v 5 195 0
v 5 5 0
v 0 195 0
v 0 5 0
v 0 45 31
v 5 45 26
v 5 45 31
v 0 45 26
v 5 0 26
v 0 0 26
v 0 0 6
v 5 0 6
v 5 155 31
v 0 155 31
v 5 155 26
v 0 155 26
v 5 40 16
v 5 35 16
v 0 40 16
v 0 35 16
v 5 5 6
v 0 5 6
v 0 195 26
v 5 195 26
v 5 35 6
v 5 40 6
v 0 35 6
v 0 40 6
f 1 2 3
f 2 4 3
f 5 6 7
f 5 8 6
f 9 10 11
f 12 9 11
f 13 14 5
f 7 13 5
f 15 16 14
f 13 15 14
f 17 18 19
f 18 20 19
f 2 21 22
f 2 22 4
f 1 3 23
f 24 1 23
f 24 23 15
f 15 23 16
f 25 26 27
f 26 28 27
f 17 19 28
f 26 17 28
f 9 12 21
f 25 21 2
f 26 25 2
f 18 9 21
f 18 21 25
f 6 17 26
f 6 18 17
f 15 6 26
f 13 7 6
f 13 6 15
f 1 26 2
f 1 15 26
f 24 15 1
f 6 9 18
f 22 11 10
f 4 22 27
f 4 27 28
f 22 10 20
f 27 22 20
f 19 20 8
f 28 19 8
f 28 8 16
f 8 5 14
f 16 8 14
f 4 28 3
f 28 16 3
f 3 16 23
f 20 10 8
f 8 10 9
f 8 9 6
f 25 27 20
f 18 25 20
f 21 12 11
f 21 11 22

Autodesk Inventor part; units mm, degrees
ref_plane "YZ Plane" through (0, 0, 0) normal (1, 0, 0) x (0, 1, 0)
ref_plane "XZ Plane" through (0, 0, 0) normal (0, 1, 0) x (-1, 0, 0)
ref_plane "XY Plane" through (0, 0, 0) normal (0, 0, 1) x (1, 0, 0)
sketch "Sketch1" plane through (0, 0, 0) normal (1, 0, 0) x (0, 1, 0)
  line L0 (0, 0) -> (200, 0)
  line L1 (200, 0) -> (200, 31)
  line L2 (200, 31) -> (0, 31)
  line L3 (0, 31) -> (0, 0)
  dimension "d0" = 31
  dimension "d1" = 200
extrude "Extrusion1" add sketch "Sketch1" along normal blind 5
sketch "Sketch2" plane through (0, 0, 0) normal (-1, 0, 0) x (0, 0, 1)
  line L0 (0, 200) -> (31, 200) projected
  line L1 (31, 200) -> (26, 200)
  line L2 (26, 200) -> (26, 195)
  line L3 (26, 195) -> (31, 195)
  line L4 (31, 195) -> (31, 200)
  line L5 (0, 200) -> (5, 200)
  line L6 (5, 200) -> (5, 195)
  line L7 (5, 195) -> (0, 195)
  line L8 (0, 195) -> (0, 200)
  line L9 (31, 0) -> (0, 0) projected
  line L10 (0, 0) -> (5, 0)
  line L11 (5, 0) -> (5, 5)
  line L12 (5, 5) -> (0, 5)
  line L13 (0, 5) -> (0, 0)
  line L14 (31, 200) -> (31, 0) projected
  line L15 (31, 0) -> (26, 0)
  line L16 (26, 0) -> (26, 5)
  line L17 (26, 5) -> (31, 5)
  line L18 (31, 5) -> (31, 0)
  line L19 (31, 195) -> (26, 195)
  line L20 (26, 195) -> (26, 155)
  line L21 (26, 155) -> (31, 155)
  line L22 (31, 155) -> (31, 195)
  line L23 (31, 5) -> (26, 5)
  line L24 (26, 5) -> (26, 45)
  line L25 (26, 45) -> (31, 45)
  line L26 (31, 45) -> (31, 5)
  point P0 (31, 5)
  point P1 (26, 0)
  point P2 (31, 45)
  point P3 (31, 155)
  dimension "d4" = 5
  dimension "d5" = 5
  dimension "d6" = 5
  dimension "d7" = 5
  dimension "d8" = 5
  dimension "d9" = 5
  dimension "d10" = 5
  dimension "d11" = 5
  dimension "d14" = 40
  dimension "d15" = 40
extrude "Extrusion2" cut sketch "Sketch2" against normal blind 10 contours L0 L4 L3 L2 | L3 L14 L21 L20 | L9 L16 L17 L14 | L17 L24 L25 L14
sketch "Sketch3" plane through (0, 0, 0) normal (-1, 0, 0) x (0, 0, 1)
  line L0 (6, 35) -> (16, 35) projected
  line L1 (6, 40) -> (16, 40) projected
  line L2 (1, 40) -> (1, 35) projected
  line L3 (16, 40) -> (16, 35)
  line L4 (26, 45) -> (26, 0) projected
  point P0 (0, 0)
  point P1 (26, 0)
sketch "Sketch3 outline for Extrusion3" plane through (0, 0, 0) normal (-1, 0, 0) x (0, 0, 1)
  line L0 (6, 40) -> (6, 35)
  line L1 (16, 40) -> (6, 40)
  line L2 (16, 35) -> (16, 40)
  line L3 (6, 35) -> (16, 35)
extrude "Extrusion3" cut sketch "Sketch3 outline for Extrusion3" against normal blind 10
sketch "Sketch4" plane through (0, 0, 0) normal (-1, 0, 0) x (0, 0, 1)
  line L0 (26, 200) -> (26, 155) projected
  line L1 (0, 0) -> (0, 200) projected
  line L2 (26, 200) -> (0, 200)
  line L3 (0, 200) -> (0, 195)
  line L4 (0, 195) -> (26, 195)
  line L5 (26, 195) -> (26, 200)
  dimension "d18" = 5
extrude "Extrusion4" cut sketch "Sketch4" against normal blind 10
sketch "Sketch5" plane through (5, 0, 0) normal (1, 0, 0) x (0, 0, -1)
  line L0 (0, 0) -> (0, 195) projected
  line L1 (0, 0) -> (-6, 0)
  line L2 (-6, 0) -> (-6, 5)
  line L3 (-6, 5) -> (0, 5)
  line L4 (0, 5) -> (0, 0)
  line L5 (-6, 40) -> (-6, 35) projected
  point P0 (0, 5)
  dimension "d21" = 6
  dimension "d22" = 5
  dimension "d23" = 6
extrude "Extrusion5" cut sketch "Sketch5" against normal blind 10
equation "\"d6\" = d4"
equation "\"d7\" = d4"
equation "\"d8\" = d5"
equation "\"d9\" = d8"
equation "\"d11\" = d8"
properties part number "FanVerticalPlate"
